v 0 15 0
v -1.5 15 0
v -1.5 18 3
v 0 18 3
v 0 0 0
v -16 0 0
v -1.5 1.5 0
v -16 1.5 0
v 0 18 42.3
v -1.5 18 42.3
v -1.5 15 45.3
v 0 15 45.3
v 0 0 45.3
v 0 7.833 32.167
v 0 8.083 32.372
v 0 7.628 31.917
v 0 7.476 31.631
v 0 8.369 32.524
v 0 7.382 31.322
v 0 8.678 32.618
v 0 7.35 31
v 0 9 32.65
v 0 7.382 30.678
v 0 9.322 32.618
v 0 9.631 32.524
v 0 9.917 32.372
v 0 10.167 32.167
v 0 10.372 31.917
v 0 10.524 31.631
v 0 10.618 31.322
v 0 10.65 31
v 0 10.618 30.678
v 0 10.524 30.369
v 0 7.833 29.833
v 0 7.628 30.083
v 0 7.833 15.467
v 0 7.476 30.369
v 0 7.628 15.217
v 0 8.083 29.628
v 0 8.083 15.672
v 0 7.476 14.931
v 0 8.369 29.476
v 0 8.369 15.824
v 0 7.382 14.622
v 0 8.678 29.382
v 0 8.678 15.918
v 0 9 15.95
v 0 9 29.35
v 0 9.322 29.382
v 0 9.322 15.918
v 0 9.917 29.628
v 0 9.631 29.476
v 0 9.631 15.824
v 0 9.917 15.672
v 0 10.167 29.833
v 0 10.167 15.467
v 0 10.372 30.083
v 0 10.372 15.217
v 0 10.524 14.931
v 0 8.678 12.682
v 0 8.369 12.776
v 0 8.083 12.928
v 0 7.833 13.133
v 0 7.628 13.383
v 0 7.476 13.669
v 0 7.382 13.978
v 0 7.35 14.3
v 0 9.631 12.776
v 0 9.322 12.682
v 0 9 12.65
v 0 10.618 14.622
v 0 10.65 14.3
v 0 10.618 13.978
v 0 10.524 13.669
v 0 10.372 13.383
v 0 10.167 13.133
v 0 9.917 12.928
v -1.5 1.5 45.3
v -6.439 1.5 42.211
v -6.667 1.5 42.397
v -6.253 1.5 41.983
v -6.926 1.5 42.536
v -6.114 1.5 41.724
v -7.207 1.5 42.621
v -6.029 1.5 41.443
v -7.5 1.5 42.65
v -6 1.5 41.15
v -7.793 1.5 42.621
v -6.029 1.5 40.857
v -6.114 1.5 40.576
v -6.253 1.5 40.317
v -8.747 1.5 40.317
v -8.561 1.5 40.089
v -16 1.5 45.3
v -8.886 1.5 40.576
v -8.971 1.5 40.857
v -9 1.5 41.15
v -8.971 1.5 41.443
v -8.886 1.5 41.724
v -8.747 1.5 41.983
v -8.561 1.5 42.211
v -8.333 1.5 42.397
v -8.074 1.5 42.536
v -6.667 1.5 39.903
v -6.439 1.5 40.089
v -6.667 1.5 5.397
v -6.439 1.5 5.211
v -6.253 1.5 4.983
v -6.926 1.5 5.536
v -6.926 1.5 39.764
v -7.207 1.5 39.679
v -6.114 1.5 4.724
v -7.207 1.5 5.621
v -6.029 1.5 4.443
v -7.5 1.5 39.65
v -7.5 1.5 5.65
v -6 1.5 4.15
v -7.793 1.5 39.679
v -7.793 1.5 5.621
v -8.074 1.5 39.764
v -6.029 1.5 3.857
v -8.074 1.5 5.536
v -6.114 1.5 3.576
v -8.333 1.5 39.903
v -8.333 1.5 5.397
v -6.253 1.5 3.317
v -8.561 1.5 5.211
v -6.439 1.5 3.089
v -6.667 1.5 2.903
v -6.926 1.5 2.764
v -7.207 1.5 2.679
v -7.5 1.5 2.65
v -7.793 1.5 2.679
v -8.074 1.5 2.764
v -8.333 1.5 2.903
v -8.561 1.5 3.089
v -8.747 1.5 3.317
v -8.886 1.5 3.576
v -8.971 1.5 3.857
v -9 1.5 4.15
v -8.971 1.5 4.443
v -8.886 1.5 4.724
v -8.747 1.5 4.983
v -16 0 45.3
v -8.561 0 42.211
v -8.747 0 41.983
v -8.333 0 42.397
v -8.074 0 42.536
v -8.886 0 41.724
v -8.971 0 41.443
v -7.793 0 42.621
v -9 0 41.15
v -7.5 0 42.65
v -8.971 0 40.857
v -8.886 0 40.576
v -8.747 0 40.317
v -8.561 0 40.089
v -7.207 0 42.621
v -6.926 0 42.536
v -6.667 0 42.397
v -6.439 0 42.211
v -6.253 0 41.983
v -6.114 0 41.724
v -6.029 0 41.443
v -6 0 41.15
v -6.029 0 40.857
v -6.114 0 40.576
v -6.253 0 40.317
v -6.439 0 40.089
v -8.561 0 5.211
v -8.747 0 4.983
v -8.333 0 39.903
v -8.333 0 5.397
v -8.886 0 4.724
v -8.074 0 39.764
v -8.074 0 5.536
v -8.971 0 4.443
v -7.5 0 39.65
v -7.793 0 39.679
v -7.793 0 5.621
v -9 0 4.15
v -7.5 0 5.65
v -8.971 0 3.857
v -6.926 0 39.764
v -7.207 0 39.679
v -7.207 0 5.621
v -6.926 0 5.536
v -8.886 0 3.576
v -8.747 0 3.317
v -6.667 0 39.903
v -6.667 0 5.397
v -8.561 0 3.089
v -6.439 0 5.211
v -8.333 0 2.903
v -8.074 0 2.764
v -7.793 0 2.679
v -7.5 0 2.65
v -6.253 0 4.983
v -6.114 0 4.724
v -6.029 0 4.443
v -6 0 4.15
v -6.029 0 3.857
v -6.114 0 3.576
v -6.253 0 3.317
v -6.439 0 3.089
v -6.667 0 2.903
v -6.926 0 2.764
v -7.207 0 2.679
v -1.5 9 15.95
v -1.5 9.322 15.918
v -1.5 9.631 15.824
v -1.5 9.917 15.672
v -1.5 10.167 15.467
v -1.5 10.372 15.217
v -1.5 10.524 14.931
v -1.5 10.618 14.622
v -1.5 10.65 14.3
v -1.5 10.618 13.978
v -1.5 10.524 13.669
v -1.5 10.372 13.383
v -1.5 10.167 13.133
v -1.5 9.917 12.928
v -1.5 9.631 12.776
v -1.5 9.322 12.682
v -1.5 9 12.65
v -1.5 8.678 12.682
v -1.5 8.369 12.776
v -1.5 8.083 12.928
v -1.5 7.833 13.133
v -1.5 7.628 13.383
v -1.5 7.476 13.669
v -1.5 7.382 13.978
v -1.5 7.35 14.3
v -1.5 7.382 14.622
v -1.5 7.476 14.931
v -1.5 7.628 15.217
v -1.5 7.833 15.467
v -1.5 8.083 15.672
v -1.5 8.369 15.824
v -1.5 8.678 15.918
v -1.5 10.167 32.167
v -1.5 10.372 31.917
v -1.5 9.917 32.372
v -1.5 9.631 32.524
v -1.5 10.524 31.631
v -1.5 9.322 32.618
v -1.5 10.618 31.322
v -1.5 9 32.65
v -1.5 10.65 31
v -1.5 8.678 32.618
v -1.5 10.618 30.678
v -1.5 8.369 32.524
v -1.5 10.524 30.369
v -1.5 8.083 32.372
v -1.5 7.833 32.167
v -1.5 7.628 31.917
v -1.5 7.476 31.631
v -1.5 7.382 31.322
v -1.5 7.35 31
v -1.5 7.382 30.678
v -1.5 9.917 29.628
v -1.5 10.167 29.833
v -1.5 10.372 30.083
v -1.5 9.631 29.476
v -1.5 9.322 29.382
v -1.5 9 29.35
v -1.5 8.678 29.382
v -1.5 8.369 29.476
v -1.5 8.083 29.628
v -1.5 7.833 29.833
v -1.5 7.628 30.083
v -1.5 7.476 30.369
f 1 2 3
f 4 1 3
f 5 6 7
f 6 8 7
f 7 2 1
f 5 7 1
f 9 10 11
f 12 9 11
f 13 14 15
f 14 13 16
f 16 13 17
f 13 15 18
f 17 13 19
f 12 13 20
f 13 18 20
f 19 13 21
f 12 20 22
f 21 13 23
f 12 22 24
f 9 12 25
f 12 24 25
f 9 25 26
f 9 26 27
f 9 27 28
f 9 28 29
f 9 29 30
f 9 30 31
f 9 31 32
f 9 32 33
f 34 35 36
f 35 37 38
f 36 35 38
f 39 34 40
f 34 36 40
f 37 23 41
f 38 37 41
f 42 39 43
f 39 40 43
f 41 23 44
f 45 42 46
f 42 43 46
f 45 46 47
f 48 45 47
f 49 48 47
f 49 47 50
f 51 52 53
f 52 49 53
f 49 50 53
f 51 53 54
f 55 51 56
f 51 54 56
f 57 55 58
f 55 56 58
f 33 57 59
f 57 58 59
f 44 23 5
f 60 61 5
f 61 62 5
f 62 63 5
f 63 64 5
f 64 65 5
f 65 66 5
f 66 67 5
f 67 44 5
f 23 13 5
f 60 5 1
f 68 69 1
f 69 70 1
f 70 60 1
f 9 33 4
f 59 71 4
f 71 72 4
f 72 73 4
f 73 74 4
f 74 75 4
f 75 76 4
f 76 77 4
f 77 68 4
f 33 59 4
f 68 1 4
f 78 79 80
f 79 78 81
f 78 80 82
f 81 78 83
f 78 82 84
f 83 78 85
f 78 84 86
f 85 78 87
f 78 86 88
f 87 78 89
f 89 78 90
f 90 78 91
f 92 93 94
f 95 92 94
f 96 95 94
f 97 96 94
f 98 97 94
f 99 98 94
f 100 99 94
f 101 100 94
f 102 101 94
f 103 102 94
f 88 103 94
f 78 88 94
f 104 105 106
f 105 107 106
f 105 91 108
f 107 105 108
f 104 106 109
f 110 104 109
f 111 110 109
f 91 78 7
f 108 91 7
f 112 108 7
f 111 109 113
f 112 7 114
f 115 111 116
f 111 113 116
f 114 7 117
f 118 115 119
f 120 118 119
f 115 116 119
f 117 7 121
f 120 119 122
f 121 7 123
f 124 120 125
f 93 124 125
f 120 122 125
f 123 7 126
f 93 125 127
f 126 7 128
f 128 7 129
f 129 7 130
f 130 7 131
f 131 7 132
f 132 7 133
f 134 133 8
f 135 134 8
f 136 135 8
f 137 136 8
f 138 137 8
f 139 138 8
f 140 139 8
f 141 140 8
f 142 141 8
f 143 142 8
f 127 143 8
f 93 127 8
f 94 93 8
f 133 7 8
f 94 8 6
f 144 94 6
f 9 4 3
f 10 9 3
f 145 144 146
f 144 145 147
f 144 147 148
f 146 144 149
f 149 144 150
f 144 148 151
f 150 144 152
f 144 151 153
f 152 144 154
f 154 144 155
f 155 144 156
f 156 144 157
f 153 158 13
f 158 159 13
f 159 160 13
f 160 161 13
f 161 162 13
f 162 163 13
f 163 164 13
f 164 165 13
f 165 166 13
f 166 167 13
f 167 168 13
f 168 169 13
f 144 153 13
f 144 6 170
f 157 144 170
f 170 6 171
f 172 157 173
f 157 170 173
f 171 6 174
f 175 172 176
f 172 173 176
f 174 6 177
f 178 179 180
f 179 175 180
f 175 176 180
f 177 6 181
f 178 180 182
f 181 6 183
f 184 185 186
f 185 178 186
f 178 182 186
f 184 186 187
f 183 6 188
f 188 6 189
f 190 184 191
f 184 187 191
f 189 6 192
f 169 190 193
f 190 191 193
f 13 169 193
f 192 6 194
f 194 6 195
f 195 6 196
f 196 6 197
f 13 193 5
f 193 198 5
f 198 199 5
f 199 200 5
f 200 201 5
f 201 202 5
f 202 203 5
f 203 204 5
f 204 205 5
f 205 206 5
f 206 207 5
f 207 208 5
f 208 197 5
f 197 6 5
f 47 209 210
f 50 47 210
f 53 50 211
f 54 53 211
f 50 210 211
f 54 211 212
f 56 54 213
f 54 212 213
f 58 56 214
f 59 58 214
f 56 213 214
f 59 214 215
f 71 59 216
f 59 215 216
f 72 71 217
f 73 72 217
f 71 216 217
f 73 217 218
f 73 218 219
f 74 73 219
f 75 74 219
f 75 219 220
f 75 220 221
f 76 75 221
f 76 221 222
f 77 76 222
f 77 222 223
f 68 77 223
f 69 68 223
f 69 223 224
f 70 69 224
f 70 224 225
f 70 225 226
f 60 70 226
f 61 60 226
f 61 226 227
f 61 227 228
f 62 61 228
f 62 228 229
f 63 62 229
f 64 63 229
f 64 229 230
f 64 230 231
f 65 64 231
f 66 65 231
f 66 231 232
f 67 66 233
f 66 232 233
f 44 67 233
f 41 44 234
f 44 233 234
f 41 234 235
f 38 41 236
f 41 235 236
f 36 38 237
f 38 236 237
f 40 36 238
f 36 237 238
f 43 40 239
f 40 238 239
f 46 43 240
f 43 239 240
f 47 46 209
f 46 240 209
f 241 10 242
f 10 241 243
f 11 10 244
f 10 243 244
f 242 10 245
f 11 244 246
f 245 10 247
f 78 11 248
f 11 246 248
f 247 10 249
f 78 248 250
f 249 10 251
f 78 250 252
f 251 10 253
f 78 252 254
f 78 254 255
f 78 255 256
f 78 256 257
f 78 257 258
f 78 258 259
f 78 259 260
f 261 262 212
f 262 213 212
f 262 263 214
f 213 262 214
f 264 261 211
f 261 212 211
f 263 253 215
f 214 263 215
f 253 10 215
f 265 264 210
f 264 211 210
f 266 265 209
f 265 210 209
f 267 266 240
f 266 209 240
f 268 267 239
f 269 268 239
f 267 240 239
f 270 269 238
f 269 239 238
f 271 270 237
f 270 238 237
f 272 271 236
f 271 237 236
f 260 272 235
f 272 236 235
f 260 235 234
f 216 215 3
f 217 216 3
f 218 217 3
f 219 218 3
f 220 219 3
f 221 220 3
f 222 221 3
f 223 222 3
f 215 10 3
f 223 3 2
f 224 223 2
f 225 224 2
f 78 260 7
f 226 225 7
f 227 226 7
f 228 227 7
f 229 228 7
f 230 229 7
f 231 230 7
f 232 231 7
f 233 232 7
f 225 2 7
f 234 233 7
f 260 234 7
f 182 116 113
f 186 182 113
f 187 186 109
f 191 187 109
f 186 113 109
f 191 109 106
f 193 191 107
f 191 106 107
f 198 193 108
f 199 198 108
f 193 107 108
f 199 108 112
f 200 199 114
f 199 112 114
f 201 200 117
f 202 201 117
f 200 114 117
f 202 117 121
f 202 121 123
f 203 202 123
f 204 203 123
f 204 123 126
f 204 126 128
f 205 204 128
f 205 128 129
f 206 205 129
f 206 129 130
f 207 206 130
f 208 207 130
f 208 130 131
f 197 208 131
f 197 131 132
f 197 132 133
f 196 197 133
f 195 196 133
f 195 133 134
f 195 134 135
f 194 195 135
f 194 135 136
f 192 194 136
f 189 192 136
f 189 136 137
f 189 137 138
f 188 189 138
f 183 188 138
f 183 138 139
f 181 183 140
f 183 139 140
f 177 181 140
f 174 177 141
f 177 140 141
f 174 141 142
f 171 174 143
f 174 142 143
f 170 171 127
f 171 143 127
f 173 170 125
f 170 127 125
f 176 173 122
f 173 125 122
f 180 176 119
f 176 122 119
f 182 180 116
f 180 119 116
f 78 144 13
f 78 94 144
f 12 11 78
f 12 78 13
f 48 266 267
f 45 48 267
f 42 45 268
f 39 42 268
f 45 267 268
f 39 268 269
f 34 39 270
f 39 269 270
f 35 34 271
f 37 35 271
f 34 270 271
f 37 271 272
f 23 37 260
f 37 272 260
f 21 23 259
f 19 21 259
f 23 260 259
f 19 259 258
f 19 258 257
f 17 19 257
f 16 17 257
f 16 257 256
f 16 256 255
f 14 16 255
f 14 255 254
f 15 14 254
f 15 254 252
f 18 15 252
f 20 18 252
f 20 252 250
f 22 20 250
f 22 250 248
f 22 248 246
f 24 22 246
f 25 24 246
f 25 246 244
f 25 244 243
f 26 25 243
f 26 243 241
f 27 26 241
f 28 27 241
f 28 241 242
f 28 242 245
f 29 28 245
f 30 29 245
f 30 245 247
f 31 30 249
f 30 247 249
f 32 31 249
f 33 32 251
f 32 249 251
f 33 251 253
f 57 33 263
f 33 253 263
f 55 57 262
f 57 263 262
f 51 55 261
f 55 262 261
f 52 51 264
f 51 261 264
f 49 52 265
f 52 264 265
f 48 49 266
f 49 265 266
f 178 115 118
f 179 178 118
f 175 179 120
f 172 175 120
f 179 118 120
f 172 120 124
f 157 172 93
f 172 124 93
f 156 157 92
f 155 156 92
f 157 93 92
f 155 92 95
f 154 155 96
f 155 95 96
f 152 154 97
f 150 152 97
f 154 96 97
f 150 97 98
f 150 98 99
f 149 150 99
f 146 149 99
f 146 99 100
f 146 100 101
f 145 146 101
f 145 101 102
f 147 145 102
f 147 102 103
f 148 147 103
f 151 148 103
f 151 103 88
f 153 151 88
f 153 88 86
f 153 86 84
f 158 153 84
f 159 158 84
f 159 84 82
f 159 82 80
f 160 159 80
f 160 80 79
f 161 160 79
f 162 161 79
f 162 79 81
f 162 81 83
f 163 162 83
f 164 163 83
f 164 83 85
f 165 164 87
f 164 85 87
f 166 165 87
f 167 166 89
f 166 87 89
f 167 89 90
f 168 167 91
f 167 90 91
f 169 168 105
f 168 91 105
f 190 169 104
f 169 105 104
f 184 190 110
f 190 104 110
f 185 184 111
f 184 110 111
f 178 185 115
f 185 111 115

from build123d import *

# Parameters (mm, degrees)
BOSS_EXTRUDE1_DEPTH = 45.3
SKETCH2_R           = 1.65
CUT_EXTRUDE1_DEPTH  = 50.873239317
SKETCH3_R           = 1.5
CUT_EXTRUDE2_DEPTH  = 51.797047158


with BuildPart() as part:
    # Sketch1 → Boss-Extrude1 (new body)
    with BuildSketch(Plane.XY):
        Polygon((0, 0), (0, 18), (-1.5, 18), (-1.5, 1.5), (-16, 1.5), (-16, 0), align=None)
    extrude(amount=BOSS_EXTRUDE1_DEPTH)

    # Sketch2 → Cut-Extrude1 (cut, through all)
    with BuildSketch(Plane(origin=(-1.5, 3, 0), x_dir=(0, 1, 0), z_dir=(-1, 0, 0))):
        Polygon((12, 0), (15, -3), (15, 0), align=None)
        Polygon((15, -42.3), (12, -45.3), (15, -45.3), align=None)
        with Locations((6, -31)):
            Circle(SKETCH2_R)
        with Locations((6, -14.3)):
            Circle(SKETCH2_R)
    extrude(amount=-CUT_EXTRUDE1_DEPTH, mode=Mode.SUBTRACT)

    # Sketch3 → Cut-Extrude2 (cut, through all)
    with BuildSketch(Plane(origin=(0, 1.5, 0), x_dir=(1, 0, 0), z_dir=(0, 1, 0))):
        with Locations((-7.5, -4.15)):
            Circle(SKETCH3_R)
        with Locations((-7.5, -41.15)):
            Circle(SKETCH3_R)
    extrude(amount=-CUT_EXTRUDE2_DEPTH, mode=Mode.SUBTRACT)


solid = part.part
